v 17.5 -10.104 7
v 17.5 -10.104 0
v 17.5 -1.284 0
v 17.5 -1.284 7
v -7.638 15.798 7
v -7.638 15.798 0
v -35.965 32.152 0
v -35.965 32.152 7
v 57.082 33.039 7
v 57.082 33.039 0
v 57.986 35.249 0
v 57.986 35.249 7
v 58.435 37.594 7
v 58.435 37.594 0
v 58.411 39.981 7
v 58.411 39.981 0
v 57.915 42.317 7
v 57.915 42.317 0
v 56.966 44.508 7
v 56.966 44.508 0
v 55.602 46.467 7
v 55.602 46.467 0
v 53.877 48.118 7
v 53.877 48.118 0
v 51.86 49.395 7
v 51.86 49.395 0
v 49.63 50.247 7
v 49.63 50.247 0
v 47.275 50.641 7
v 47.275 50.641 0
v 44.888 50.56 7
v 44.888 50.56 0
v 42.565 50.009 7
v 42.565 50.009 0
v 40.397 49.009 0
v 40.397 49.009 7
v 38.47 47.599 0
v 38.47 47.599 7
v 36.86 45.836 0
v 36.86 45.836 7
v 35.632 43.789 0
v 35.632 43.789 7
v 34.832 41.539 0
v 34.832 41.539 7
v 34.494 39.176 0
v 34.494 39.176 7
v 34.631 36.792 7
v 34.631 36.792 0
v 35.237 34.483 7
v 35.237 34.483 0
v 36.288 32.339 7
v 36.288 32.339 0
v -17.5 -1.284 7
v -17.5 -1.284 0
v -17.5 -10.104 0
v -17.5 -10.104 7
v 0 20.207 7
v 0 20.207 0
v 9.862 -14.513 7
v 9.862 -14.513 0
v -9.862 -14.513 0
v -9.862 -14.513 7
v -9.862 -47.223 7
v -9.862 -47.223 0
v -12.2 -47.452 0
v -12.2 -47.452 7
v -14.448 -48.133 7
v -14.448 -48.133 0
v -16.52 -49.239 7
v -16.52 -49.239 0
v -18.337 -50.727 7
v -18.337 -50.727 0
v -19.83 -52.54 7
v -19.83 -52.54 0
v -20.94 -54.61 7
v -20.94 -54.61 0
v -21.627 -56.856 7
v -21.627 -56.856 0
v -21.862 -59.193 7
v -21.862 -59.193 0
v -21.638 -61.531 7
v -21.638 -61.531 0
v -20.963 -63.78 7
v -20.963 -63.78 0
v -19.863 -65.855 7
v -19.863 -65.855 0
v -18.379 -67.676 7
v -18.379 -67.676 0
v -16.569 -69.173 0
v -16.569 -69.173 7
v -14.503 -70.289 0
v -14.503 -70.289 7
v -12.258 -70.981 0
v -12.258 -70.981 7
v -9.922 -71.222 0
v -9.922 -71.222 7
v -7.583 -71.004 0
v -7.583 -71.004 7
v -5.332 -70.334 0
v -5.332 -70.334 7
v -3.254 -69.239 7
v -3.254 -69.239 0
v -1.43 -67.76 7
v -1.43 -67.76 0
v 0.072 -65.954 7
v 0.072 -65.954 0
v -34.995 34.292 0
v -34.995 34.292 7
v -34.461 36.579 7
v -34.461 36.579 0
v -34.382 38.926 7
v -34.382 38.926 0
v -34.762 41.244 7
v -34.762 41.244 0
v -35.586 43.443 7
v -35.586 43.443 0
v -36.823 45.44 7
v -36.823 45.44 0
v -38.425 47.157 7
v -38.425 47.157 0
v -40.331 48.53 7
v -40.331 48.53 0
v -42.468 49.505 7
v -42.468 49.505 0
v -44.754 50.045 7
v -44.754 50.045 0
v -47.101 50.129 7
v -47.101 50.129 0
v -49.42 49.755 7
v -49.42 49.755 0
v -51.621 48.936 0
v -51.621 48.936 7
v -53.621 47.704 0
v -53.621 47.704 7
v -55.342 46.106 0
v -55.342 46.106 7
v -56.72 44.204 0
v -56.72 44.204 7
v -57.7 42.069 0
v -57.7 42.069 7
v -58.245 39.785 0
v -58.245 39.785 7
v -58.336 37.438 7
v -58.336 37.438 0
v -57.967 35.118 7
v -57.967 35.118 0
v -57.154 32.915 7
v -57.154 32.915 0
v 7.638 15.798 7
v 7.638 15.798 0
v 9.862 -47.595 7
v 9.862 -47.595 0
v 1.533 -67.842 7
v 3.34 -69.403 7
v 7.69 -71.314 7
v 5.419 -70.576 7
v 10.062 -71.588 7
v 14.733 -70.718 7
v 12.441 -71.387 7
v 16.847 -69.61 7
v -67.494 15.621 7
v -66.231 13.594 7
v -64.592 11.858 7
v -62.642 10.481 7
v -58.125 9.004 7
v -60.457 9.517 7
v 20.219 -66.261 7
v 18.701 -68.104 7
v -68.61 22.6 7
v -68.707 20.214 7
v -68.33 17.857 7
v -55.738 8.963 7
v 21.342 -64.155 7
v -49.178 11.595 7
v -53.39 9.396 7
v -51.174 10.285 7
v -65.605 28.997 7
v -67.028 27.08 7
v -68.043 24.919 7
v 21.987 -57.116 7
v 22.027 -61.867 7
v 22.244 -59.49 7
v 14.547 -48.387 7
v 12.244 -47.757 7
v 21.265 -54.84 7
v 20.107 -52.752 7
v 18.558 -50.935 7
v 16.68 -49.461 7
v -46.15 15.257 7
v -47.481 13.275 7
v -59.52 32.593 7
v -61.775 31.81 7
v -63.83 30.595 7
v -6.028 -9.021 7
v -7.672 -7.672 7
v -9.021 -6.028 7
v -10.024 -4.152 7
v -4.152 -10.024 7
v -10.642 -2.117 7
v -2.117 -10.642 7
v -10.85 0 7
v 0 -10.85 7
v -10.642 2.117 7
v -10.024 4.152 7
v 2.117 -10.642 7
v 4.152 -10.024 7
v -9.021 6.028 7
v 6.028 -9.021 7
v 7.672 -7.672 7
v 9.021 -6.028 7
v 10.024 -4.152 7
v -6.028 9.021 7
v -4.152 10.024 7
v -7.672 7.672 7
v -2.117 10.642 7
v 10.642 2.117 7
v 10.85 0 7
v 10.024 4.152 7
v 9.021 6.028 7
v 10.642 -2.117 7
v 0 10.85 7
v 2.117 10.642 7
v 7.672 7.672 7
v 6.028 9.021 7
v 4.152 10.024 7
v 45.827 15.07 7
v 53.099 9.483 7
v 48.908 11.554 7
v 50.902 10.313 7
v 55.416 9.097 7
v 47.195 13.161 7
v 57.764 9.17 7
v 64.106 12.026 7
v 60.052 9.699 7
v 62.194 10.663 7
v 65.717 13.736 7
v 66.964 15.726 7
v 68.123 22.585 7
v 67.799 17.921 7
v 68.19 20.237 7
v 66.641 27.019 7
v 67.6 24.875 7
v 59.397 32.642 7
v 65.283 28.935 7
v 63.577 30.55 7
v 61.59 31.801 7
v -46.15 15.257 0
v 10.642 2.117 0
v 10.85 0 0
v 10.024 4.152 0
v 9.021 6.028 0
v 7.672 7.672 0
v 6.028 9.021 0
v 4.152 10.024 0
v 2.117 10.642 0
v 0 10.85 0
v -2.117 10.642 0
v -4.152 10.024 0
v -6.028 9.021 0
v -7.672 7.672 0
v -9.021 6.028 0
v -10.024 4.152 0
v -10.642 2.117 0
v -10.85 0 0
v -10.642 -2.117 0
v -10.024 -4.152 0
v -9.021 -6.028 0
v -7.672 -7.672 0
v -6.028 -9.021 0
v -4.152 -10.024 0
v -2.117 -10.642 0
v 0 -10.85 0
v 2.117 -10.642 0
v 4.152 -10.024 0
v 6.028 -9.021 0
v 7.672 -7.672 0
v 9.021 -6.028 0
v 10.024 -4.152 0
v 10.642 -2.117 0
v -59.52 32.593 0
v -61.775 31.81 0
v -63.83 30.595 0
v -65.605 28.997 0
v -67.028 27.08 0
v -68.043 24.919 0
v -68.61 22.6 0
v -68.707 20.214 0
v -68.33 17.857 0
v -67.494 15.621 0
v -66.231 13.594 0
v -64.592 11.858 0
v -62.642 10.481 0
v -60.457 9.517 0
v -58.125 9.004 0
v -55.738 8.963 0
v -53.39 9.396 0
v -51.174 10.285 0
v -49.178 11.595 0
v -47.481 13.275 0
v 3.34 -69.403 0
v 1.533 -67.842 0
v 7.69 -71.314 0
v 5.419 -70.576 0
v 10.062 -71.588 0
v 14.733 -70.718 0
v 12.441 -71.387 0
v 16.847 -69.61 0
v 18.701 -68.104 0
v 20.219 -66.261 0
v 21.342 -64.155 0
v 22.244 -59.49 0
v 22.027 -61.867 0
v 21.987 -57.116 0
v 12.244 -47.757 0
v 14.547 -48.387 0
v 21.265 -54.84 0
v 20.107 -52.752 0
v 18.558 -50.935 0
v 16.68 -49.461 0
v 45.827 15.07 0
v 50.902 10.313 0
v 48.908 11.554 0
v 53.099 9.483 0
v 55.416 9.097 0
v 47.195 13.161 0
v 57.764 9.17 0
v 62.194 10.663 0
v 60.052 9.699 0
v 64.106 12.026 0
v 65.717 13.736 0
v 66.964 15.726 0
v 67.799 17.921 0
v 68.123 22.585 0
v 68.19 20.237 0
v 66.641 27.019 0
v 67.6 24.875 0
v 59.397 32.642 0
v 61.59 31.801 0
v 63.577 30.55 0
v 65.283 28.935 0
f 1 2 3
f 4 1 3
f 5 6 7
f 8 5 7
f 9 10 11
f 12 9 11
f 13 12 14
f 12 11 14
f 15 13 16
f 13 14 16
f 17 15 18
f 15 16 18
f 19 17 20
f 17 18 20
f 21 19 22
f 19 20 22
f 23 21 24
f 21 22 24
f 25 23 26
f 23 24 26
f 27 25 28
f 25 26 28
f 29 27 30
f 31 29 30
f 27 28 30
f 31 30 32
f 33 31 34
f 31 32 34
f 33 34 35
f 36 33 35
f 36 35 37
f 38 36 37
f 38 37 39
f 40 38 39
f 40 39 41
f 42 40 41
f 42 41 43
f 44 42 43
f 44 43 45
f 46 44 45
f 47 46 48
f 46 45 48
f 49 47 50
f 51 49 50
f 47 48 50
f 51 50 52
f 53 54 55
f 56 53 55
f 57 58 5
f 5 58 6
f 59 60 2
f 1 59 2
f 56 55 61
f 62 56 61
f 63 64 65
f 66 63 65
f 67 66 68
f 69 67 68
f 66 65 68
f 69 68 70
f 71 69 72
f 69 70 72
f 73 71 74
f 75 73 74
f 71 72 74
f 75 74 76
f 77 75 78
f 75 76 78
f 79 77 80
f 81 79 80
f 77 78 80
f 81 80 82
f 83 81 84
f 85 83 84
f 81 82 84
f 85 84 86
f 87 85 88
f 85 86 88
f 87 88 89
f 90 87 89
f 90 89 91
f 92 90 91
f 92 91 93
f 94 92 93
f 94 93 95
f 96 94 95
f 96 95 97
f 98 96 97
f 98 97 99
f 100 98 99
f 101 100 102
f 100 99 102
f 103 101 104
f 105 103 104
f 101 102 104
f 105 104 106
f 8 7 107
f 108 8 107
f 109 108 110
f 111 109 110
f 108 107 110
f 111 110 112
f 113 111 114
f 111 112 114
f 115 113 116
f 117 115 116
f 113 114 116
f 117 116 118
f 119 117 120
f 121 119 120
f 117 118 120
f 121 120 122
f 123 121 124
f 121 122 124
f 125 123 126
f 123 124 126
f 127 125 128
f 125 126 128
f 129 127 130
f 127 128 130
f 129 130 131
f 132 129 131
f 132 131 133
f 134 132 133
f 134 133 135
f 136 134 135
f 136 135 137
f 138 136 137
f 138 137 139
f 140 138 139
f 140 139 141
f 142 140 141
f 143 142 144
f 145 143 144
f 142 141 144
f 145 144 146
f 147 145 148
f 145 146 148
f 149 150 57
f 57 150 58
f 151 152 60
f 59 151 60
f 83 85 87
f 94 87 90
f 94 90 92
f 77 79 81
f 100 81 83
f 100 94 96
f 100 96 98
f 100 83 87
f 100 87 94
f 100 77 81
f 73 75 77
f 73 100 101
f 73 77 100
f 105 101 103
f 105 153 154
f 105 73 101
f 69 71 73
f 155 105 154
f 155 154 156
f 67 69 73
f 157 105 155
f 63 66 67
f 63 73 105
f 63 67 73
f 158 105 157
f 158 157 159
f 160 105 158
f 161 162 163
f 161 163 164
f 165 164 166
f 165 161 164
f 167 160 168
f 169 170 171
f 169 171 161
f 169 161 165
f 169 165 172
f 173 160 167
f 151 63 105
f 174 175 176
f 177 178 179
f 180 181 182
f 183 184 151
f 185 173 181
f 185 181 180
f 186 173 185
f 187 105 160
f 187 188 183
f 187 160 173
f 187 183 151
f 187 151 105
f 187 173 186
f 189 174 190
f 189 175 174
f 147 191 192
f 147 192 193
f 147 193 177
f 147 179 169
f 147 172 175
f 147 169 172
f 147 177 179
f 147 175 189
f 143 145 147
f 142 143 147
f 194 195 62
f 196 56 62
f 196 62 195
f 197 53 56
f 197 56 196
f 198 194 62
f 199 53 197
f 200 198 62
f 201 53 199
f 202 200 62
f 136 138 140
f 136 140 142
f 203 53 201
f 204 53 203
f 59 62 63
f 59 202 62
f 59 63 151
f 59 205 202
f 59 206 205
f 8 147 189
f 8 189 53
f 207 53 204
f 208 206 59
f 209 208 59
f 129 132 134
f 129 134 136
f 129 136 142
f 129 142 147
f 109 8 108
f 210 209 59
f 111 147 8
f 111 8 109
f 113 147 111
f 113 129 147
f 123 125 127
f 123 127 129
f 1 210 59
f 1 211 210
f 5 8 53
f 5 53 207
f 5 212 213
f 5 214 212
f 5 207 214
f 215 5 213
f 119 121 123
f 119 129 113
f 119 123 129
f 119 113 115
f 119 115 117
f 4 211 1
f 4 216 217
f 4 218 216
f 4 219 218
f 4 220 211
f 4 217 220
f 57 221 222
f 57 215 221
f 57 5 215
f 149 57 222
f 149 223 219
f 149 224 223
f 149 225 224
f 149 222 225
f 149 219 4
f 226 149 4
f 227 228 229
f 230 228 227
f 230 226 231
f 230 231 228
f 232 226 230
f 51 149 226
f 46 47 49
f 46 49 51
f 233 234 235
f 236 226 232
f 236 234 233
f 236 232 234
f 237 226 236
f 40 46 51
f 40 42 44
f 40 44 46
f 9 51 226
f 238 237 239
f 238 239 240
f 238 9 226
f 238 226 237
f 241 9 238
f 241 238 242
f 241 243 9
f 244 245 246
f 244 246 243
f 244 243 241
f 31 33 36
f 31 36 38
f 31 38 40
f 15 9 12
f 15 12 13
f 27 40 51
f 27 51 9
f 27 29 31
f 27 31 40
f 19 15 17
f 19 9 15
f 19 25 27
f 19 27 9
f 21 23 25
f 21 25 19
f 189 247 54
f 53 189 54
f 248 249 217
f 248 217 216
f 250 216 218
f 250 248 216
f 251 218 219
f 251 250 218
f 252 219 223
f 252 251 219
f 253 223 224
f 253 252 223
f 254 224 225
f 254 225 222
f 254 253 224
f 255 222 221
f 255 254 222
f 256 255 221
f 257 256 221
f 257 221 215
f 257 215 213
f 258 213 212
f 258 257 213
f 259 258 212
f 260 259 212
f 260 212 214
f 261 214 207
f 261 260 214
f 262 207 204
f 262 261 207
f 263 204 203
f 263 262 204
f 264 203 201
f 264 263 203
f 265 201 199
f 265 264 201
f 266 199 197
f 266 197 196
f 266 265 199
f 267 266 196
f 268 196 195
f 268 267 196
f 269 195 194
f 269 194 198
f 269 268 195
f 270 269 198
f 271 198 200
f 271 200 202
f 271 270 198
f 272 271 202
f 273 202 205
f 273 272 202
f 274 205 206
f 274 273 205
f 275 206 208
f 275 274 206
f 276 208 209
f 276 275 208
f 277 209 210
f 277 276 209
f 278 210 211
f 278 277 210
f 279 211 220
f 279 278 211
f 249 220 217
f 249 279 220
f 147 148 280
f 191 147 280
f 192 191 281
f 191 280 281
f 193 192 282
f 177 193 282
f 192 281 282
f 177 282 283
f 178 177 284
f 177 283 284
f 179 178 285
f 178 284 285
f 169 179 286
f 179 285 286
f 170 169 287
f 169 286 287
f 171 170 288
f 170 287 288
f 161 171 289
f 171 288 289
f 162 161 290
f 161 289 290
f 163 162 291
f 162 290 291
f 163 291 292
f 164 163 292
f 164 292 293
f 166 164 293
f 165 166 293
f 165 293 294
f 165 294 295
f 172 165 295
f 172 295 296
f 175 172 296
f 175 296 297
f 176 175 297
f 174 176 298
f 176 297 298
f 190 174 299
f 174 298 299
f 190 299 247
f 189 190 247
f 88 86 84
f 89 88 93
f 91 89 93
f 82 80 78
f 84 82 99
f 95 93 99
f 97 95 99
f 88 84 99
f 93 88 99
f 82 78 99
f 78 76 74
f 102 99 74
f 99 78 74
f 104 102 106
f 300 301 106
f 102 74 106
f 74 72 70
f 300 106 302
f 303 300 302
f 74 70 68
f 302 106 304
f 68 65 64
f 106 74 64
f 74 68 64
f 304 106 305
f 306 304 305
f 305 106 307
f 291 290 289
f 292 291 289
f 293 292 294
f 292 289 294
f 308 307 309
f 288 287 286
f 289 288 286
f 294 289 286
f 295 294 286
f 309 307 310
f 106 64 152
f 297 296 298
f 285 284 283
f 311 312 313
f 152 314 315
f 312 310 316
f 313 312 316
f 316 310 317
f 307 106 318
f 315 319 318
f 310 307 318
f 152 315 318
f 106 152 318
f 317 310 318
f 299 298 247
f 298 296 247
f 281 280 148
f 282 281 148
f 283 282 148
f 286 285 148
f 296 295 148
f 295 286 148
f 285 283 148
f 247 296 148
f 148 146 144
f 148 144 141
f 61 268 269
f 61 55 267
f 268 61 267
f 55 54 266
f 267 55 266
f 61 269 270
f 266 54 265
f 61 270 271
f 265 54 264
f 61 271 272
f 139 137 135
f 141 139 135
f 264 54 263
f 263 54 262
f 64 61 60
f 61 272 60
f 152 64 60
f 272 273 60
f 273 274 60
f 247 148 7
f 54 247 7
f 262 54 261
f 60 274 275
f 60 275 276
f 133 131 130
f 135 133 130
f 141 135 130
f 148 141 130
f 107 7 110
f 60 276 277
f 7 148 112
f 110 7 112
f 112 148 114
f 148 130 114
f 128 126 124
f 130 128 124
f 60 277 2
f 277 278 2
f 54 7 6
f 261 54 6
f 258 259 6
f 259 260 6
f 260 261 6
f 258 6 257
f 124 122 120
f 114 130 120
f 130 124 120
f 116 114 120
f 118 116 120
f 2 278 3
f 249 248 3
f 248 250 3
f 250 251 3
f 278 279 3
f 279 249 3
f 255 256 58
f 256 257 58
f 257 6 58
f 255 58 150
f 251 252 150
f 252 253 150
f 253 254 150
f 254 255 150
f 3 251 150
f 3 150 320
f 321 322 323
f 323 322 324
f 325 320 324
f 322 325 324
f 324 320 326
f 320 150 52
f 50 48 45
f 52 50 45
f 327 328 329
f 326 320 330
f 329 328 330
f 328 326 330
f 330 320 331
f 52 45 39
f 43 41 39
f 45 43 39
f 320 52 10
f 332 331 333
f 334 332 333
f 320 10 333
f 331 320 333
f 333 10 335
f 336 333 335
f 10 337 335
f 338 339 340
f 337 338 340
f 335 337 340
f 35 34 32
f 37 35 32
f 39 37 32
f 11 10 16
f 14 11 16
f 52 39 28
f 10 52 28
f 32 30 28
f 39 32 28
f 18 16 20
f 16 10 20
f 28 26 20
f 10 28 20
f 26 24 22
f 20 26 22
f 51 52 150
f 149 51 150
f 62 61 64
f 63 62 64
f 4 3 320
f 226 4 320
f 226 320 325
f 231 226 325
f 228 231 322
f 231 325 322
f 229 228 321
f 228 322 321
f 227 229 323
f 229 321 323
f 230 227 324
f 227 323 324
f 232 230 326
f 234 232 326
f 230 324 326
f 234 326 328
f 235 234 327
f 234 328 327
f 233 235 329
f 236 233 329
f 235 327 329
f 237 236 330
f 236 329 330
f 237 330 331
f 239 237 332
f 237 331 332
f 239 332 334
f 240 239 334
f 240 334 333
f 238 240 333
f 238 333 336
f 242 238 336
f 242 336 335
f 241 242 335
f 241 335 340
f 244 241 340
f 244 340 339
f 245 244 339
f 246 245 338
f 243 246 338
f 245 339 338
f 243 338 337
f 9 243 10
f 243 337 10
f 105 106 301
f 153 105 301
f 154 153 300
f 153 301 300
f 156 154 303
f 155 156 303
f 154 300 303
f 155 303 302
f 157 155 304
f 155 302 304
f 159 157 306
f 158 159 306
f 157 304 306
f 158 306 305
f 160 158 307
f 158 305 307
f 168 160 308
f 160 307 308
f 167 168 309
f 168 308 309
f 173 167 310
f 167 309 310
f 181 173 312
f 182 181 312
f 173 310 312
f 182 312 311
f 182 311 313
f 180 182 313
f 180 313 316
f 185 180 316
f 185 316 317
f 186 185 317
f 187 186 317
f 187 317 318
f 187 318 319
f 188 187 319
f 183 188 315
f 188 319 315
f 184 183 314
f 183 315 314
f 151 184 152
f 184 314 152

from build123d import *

# Parameters (mm, degrees)
F0_R     = 10.85
F1_DEPTH = 7


with BuildPart() as f1:
    # F0 (on Top) → F1 (new body)
    with BuildSketch(Plane.XY):
        with BuildLine():
            Line((-17.5, -10.10363), (-9.862379, -14.513212))
            Line((-9.862379, -14.513212), (-9.862379, -47.222504))
            ThreePointArc((-9.862379, -47.222504), (-20.463736, -64.844891), (0.071775, -65.953967))
            ThreePointArc((0.071775, -65.953967), (20.833211, -65.236064), (9.862379, -47.595388))
            Line((9.862379, -47.595388), (9.862379, -14.513212))
            Line((9.862379, -14.513212), (17.5, -10.10363))
            Line((17.5, -10.10363), (17.5, -1.284465))
            Line((17.5, -1.284465), (45.827078, 15.070181))
            ThreePointArc((45.827078, 15.070181), (66.389191, 14.70033), (57.081923, 33.039142))
            ThreePointArc((57.081923, 33.039142), (46.079483, 50.660122), (36.287625, 32.338765))
            Line((36.287625, 32.338765), (7.637621, 15.797677))
            Line((7.637621, 15.797677), (0, 20.207259))
            Line((0, 20.207259), (-7.637621, 15.797677))
            Line((-7.637621, 15.797677), (-35.964699, 32.152323))
            ThreePointArc((-35.964699, 32.152323), (-45.925454, 50.144561), (-57.153698, 32.914825))
            ThreePointArc((-57.153698, 32.914825), (-66.912694, 14.575942), (-46.150004, 15.256623))
            Line((-46.150004, 15.256623), (-17.5, -1.284465))
            Line((-17.5, -1.284465), (-17.5, -10.10363))
        make_face()
        Circle(F0_R, mode=Mode.SUBTRACT)
    extrude(amount=F1_DEPTH)


solid = f1.part
